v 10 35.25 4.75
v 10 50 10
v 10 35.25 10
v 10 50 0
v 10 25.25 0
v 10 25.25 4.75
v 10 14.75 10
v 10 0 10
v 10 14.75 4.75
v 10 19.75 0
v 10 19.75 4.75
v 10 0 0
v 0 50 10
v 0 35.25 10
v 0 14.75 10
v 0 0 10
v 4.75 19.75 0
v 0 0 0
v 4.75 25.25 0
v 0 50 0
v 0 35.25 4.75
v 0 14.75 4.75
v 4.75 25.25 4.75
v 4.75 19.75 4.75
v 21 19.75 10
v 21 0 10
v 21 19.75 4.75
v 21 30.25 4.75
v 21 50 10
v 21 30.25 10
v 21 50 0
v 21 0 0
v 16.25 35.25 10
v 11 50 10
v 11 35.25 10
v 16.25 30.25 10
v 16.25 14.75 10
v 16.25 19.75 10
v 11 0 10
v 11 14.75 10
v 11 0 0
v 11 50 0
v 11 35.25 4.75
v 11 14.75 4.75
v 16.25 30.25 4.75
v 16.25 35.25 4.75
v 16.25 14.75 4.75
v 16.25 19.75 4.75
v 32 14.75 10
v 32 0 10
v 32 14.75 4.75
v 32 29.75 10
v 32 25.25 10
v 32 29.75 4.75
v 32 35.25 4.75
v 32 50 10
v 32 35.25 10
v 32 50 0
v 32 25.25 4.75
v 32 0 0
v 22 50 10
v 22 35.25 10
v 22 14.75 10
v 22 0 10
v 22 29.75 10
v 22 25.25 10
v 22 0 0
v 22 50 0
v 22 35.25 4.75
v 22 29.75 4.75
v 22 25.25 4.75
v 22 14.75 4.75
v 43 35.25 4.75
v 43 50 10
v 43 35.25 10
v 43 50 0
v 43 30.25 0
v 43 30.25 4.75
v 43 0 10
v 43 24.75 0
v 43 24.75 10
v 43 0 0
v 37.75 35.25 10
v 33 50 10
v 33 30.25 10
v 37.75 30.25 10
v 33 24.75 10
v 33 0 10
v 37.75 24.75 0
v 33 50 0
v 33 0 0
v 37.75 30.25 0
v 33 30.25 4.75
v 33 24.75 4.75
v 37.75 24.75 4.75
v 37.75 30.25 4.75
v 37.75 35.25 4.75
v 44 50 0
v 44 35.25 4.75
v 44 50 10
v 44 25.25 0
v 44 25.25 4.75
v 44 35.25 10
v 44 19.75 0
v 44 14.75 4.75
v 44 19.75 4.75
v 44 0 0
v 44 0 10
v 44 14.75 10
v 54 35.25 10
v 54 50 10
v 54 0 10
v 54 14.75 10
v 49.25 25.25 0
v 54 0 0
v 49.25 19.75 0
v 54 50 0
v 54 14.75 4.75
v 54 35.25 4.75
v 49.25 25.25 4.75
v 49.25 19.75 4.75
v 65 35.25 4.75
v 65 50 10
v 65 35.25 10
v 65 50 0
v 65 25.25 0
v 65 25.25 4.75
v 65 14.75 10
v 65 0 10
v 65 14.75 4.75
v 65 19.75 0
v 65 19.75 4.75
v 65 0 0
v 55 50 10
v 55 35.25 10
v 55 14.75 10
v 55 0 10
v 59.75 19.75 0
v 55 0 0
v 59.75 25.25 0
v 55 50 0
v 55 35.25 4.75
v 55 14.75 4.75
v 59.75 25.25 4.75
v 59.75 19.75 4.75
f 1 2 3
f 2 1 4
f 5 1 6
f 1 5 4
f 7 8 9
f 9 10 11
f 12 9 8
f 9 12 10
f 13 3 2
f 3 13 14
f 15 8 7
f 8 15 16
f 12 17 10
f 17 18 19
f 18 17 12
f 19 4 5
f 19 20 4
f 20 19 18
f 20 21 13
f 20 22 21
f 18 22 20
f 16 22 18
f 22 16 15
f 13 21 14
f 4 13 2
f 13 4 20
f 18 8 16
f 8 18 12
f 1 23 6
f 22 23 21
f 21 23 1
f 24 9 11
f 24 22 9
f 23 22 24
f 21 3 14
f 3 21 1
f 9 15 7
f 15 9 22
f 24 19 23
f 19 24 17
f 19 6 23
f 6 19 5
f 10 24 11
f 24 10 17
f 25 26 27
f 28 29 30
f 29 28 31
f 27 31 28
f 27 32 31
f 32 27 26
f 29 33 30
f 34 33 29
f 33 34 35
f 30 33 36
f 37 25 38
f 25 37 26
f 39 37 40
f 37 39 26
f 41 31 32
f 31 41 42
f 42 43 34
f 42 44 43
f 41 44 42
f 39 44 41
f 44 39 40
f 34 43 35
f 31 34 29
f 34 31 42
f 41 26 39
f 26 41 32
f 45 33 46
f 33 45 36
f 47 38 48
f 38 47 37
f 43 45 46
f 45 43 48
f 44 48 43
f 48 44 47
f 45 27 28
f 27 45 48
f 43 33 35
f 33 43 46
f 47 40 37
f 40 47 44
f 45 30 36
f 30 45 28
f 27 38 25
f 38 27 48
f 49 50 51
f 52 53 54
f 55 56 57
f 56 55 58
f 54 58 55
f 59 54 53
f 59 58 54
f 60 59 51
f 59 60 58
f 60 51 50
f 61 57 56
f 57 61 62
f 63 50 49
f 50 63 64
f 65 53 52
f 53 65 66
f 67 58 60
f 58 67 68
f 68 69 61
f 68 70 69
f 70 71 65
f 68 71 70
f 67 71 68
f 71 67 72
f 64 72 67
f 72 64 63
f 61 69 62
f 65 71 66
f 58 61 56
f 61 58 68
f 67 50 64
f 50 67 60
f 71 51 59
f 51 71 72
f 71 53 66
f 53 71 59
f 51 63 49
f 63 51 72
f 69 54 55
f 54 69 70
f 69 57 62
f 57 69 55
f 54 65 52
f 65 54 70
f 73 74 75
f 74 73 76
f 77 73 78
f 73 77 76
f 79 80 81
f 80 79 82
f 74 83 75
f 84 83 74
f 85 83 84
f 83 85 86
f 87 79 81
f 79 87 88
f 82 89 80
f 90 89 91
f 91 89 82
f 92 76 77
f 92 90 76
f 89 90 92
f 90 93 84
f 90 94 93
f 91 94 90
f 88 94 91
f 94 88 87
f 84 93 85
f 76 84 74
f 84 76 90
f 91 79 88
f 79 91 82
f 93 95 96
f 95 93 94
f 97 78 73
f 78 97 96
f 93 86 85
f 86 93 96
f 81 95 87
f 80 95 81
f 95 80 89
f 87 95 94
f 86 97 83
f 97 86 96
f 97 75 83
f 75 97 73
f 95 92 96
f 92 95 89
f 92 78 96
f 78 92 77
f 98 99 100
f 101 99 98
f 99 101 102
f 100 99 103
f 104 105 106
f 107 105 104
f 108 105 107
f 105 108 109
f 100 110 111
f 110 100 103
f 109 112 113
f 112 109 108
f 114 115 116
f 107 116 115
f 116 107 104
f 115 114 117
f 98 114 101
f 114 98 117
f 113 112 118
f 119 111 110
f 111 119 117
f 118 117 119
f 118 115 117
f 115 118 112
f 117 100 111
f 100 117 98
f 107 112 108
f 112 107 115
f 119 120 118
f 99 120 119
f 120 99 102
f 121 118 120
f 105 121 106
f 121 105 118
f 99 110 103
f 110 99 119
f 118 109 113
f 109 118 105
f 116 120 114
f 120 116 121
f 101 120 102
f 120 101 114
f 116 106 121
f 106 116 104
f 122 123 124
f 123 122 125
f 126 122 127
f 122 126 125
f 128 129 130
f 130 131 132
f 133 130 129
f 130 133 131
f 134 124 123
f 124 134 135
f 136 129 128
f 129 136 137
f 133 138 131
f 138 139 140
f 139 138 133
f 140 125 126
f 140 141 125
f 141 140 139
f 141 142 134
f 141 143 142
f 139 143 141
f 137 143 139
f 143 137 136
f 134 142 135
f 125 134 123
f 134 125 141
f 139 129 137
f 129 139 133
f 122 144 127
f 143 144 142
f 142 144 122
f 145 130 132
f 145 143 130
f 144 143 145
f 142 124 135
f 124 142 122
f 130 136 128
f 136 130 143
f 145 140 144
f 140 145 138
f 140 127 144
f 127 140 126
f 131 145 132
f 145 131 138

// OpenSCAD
SCALE=5.0;
GAP=0.5;

BIT = 1.0 * SCALE;
HEIGHT = 2 * BIT;
LENGTH = 5 * HEIGHT;
GAP_2=GAP / 2;
//BIT_GAP = BIT + GAP;

BLOCK=[HEIGHT, LENGTH, HEIGHT];


function bit_gap(bits) = (bits*BIT + GAP);

function bit_pos(bits) = (bits*BIT - GAP_2);

module part_one(){
    difference(){
        cube(BLOCK);
        translate([bit_pos(0), bit_pos(3), bit_pos(1)])
        cube([bit_gap(2), bit_gap(4), bit_gap(1)]);
        translate([bit_pos(1), bit_pos(4), bit_pos(0)])
        cube([bit_gap(1), bit_gap(1), bit_gap(1)]);
    };
};

module part_two(){
    difference(){
        cube(BLOCK);
        translate([bit_pos(0), bit_pos(3), bit_pos(1)])
        cube([bit_gap(1), bit_gap(4), bit_gap(1)]);
        translate([bit_pos(1), bit_pos(4), bit_pos(1)])
        cube([bit_gap(1), bit_gap(2), bit_gap(1)]);
    };
};


module part_three(){
    difference(){
        cube(BLOCK);
        translate([bit_pos(0), bit_pos(3), bit_pos(1)])
        cube([bit_gap(2), bit_gap(2), bit_gap(1)]);
        translate([bit_pos(0), bit_pos(6), bit_pos(1)])
        cube([bit_gap(2), bit_gap(1), bit_gap(1)]);
    };
};

module part_four(){
    difference(){
        cube(BLOCK);
        translate([bit_pos(0), bit_pos(5), bit_pos(1)])
        cube([bit_gap(1), bit_gap(1), bit_gap(1)]);
        translate([bit_pos(1), bit_pos(5), bit_pos(1)])
        cube([bit_gap(1), bit_gap(2), bit_gap(1)]);
        translate([bit_pos(1), bit_pos(5), bit_pos(0)])
        cube([bit_gap(1), bit_gap(1), bit_gap(1)]);
    };
};

module part_five(){
        translate([HEIGHT,0,0])
        mirror([1,0,0])
        part_one();
};

module part_six(){
    part_one();
};

part_one();
translate([HEIGHT + 1,0,0])
part_two();
translate([2*HEIGHT + 2,0,0])
part_three();
translate([3*HEIGHT + 3,0,0])
part_four();
translate([4*HEIGHT + 4,0,0])
part_five();
translate([5*HEIGHT + 5,0,0])
part_six();
